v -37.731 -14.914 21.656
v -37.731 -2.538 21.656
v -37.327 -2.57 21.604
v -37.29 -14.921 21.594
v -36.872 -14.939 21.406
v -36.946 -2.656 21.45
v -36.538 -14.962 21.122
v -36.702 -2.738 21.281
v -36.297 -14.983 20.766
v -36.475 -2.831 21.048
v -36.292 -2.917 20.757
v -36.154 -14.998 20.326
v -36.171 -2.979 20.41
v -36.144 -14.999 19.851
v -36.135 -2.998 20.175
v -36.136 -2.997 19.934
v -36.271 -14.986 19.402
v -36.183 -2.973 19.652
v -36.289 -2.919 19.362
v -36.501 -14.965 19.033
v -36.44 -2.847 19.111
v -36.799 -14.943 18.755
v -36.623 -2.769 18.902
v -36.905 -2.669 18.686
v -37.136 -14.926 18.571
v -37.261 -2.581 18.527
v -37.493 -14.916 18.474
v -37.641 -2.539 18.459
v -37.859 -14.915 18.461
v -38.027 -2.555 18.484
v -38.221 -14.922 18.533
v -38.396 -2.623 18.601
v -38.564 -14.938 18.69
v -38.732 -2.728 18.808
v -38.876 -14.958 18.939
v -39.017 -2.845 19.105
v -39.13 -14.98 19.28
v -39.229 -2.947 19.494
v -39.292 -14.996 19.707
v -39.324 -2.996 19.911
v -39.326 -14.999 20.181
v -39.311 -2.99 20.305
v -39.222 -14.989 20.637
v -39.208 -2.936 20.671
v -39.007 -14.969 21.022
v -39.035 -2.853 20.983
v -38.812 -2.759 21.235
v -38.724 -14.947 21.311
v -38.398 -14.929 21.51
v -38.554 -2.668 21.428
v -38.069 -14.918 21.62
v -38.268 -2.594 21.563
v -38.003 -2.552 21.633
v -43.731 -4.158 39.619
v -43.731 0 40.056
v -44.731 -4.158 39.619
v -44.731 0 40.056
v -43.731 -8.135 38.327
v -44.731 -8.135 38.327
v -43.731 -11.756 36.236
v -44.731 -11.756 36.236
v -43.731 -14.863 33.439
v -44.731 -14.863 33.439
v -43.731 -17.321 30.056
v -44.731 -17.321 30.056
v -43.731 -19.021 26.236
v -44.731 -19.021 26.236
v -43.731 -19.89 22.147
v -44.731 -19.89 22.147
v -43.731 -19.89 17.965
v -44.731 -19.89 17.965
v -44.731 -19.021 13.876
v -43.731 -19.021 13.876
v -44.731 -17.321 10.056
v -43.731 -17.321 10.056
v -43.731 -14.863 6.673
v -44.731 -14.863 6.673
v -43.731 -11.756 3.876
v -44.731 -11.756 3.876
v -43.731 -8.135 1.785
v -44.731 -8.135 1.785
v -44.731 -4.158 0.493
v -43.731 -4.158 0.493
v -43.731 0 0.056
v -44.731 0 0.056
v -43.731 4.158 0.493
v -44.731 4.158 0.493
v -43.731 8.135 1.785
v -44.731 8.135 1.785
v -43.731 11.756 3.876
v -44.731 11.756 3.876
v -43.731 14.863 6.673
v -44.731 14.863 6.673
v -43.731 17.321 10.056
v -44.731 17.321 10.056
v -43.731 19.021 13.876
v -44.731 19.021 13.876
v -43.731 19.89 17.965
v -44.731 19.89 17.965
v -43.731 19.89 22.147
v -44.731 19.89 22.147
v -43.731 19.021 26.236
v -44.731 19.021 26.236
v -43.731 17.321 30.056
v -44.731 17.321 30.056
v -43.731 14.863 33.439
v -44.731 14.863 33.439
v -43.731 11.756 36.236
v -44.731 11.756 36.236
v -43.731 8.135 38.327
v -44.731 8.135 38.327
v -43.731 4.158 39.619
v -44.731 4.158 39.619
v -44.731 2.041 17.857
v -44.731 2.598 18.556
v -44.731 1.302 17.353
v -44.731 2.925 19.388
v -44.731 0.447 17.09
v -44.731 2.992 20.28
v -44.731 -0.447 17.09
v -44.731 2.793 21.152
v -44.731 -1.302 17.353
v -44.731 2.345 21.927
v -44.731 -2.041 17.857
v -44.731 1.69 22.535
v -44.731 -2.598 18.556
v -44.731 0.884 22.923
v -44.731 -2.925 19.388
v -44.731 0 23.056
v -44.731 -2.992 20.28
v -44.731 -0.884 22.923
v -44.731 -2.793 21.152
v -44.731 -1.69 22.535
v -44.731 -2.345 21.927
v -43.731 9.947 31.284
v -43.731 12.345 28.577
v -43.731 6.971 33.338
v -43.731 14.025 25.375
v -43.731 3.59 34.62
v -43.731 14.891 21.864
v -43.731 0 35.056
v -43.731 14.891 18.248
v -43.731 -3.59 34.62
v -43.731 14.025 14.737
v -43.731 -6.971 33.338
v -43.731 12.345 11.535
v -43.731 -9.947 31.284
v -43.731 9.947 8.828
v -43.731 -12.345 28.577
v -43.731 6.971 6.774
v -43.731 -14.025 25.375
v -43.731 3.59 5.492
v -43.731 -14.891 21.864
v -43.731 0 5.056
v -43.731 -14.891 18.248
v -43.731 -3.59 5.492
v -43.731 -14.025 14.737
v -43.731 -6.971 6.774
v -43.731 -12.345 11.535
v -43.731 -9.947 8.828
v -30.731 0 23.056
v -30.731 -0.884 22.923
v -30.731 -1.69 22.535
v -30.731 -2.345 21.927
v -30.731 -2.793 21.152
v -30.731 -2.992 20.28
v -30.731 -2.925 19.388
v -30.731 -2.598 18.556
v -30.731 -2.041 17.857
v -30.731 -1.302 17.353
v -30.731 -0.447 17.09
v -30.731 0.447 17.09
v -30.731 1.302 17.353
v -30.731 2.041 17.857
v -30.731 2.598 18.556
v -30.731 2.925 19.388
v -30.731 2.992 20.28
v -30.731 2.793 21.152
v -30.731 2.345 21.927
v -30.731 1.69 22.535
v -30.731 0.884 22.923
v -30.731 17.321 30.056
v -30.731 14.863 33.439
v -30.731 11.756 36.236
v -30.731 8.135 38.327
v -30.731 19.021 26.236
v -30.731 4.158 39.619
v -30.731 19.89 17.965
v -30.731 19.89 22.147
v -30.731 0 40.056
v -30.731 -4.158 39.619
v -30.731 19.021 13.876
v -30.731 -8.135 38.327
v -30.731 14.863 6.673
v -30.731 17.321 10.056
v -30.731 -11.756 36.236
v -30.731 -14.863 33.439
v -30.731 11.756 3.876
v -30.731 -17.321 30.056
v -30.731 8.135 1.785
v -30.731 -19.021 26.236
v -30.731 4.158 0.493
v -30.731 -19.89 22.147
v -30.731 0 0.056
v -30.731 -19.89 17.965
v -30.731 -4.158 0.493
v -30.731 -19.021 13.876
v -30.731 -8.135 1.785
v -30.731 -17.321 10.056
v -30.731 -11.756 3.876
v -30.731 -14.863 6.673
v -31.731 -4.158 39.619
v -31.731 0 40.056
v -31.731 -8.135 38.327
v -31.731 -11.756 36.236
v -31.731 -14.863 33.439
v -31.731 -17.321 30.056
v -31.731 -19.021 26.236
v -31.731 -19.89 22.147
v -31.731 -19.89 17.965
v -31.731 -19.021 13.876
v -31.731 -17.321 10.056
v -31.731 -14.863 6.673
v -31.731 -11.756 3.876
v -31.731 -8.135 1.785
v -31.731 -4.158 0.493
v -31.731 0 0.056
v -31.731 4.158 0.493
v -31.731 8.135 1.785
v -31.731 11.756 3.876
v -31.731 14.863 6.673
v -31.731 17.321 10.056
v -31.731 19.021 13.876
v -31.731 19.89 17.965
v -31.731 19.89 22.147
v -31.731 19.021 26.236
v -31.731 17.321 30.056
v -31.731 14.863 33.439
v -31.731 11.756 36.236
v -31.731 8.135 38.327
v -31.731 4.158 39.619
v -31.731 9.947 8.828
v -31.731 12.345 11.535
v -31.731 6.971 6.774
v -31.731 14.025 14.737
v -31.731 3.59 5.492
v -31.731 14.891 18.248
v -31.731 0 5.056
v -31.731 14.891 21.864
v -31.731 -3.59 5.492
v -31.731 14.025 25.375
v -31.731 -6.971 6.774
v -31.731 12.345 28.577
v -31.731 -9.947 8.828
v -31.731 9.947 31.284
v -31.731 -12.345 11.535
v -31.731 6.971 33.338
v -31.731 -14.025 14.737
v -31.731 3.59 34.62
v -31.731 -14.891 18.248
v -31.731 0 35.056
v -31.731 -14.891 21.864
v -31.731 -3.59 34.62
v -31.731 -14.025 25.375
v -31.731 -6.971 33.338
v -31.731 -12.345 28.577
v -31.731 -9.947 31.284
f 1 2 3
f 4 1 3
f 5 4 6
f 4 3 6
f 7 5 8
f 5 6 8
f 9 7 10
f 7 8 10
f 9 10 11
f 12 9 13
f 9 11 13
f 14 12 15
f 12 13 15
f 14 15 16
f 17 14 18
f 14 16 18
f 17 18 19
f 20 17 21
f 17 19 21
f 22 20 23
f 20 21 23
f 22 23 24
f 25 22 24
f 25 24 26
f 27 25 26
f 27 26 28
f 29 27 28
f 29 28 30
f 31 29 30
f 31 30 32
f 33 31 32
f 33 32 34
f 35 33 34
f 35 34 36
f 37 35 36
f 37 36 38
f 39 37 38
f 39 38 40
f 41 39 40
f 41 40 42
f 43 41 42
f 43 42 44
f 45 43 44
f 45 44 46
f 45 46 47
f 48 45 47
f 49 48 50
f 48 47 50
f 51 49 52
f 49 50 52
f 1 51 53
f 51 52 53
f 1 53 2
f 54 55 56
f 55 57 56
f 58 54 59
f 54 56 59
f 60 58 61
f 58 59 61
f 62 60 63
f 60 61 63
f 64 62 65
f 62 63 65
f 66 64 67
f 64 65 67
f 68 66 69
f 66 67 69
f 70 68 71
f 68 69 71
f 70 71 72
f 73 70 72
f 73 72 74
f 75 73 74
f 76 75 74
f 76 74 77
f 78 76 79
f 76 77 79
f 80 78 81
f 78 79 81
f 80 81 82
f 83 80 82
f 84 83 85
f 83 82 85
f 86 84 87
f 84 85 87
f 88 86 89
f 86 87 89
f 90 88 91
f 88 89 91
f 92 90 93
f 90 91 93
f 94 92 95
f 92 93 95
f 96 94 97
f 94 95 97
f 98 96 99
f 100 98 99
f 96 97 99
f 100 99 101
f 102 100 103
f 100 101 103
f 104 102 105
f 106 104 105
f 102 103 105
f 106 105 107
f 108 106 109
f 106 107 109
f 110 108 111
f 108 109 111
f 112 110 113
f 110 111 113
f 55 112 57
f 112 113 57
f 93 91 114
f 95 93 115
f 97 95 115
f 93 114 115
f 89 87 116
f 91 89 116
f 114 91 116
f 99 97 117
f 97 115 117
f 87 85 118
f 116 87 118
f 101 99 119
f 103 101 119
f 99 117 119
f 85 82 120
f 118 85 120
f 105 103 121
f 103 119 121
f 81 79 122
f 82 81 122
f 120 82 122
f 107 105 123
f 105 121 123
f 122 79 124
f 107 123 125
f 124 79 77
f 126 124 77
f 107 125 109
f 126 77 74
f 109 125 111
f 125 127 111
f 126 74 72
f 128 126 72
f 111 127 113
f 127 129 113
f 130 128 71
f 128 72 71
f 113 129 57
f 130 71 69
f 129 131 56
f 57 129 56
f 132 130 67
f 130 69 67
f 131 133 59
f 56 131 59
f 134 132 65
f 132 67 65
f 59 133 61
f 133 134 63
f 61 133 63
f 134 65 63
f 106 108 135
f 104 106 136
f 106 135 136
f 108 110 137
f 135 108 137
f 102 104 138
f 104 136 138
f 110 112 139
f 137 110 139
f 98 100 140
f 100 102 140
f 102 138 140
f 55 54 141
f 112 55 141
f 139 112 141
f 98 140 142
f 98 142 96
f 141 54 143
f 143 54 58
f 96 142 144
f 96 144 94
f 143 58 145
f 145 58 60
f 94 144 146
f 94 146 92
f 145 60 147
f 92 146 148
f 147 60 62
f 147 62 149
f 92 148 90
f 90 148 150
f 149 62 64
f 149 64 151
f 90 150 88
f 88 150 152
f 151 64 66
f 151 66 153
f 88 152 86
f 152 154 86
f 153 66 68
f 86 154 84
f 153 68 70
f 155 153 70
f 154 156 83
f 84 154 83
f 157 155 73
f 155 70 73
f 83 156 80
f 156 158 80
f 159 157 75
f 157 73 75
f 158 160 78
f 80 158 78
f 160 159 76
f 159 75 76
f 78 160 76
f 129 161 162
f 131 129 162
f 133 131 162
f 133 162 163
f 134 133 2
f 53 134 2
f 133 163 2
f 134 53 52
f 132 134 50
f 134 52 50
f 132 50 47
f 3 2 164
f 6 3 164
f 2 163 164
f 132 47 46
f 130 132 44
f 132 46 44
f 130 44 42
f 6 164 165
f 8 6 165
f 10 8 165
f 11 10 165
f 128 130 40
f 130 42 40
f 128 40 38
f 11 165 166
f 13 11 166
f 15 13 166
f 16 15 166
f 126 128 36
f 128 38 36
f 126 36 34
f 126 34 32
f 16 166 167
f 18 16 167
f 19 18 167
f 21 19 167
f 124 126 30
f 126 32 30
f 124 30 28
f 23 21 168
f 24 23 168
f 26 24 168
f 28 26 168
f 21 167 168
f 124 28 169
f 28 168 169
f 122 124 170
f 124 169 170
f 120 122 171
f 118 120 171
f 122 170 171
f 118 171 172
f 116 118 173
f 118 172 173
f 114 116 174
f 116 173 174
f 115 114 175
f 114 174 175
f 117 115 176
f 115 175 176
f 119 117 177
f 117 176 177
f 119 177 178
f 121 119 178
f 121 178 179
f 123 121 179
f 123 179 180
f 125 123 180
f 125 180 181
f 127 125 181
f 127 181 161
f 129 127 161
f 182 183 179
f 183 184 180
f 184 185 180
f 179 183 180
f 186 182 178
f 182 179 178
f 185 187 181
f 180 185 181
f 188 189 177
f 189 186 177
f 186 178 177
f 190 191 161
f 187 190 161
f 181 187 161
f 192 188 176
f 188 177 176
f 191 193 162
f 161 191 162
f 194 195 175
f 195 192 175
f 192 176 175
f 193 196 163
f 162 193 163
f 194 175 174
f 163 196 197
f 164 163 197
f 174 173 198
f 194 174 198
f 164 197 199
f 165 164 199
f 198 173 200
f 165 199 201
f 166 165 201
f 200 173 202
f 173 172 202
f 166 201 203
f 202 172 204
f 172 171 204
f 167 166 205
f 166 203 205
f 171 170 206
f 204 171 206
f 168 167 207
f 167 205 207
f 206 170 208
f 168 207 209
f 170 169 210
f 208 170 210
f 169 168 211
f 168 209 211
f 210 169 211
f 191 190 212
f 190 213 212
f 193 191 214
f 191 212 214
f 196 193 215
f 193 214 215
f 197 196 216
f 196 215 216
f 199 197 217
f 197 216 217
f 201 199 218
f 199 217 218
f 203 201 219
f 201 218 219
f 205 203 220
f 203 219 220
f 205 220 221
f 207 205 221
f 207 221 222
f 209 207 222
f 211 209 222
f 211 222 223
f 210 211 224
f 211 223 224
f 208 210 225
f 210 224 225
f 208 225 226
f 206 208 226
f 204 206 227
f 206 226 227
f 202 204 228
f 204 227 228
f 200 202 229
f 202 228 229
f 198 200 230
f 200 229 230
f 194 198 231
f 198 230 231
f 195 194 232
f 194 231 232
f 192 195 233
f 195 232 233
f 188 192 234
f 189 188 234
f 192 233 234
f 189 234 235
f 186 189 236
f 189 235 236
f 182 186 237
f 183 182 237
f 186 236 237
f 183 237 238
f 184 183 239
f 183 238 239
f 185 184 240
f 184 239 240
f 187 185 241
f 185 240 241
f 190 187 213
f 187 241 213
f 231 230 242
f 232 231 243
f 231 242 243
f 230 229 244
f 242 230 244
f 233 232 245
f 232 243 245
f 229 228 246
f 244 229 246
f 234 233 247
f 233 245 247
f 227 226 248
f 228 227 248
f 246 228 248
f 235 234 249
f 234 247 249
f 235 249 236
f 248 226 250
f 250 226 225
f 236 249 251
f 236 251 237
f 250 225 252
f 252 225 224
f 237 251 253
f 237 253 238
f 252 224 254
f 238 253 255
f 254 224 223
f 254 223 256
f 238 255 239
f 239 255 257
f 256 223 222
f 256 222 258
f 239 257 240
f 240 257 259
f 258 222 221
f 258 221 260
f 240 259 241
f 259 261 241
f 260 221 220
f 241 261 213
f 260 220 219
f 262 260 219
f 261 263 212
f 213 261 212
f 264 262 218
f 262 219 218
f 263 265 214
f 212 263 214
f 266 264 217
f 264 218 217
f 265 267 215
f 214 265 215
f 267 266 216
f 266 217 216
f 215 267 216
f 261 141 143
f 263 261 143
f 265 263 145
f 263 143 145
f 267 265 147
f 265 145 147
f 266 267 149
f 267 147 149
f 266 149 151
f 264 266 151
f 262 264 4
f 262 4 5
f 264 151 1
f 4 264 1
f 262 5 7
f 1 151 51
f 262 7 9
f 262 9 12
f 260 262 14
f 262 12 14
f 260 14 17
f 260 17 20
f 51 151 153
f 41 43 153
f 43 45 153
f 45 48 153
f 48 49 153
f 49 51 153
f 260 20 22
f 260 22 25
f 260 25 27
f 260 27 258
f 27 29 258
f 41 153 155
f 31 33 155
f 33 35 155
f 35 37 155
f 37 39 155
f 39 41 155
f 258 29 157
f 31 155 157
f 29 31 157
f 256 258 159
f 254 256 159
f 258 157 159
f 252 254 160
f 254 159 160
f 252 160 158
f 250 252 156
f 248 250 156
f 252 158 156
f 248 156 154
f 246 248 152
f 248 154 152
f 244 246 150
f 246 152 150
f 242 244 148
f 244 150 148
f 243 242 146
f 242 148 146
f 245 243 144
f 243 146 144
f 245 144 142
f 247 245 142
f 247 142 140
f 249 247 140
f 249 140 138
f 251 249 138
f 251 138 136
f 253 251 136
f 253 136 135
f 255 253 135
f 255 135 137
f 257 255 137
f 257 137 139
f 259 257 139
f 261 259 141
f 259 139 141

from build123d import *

# Parameters (mm, degrees)
SKETCH_3_R          = 1.6
CUT_EXTRUDE_1_DEPTH = 64.287719075


with BuildPart() as part:
    # ｽｹｯﾁ2 → 回転1 (revolve)
    with BuildSketch(Plane(origin=(0, 0, 0), x_dir=(1, 0, 0), z_dir=(0, 1, 0)), mode=Mode.PRIVATE) as revolve_1_sk:
        Polygon((-44.73085458, -0.056036178), (-44.73085458, -17.056036178), (-30.73085458, -17.056036178), (-30.73085458, -0.056036178), (-31.73085458, -0.056036178), (-31.73085458, -5.056036178), (-43.73085458, -5.056036178), (-43.73085458, -0.056036178), align=None)
    revolve(revolve_1_sk.sketch.rotate(Axis((-49.849406884, 0, 20.056036178), (1, 0, 0)), 180), axis=Axis((-49.849406884, 0, 20.056036178), (1, 0, 0)))

    # ｽｹｯﾁ3 → ｶｯﾄ - 押し出し1 (cut, through all)
    with BuildSketch(Plane(origin=(0, 0, 0), x_dir=(1, 0, 0), z_dir=(0, 1, 0))):
        with Locations(Location((-37.73085458, -20.056036178, 0), (0, 0, 270))):
            Circle(SKETCH_3_R)
    extrude(amount=-CUT_EXTRUDE_1_DEPTH, mode=Mode.SUBTRACT)


solid = part.part
